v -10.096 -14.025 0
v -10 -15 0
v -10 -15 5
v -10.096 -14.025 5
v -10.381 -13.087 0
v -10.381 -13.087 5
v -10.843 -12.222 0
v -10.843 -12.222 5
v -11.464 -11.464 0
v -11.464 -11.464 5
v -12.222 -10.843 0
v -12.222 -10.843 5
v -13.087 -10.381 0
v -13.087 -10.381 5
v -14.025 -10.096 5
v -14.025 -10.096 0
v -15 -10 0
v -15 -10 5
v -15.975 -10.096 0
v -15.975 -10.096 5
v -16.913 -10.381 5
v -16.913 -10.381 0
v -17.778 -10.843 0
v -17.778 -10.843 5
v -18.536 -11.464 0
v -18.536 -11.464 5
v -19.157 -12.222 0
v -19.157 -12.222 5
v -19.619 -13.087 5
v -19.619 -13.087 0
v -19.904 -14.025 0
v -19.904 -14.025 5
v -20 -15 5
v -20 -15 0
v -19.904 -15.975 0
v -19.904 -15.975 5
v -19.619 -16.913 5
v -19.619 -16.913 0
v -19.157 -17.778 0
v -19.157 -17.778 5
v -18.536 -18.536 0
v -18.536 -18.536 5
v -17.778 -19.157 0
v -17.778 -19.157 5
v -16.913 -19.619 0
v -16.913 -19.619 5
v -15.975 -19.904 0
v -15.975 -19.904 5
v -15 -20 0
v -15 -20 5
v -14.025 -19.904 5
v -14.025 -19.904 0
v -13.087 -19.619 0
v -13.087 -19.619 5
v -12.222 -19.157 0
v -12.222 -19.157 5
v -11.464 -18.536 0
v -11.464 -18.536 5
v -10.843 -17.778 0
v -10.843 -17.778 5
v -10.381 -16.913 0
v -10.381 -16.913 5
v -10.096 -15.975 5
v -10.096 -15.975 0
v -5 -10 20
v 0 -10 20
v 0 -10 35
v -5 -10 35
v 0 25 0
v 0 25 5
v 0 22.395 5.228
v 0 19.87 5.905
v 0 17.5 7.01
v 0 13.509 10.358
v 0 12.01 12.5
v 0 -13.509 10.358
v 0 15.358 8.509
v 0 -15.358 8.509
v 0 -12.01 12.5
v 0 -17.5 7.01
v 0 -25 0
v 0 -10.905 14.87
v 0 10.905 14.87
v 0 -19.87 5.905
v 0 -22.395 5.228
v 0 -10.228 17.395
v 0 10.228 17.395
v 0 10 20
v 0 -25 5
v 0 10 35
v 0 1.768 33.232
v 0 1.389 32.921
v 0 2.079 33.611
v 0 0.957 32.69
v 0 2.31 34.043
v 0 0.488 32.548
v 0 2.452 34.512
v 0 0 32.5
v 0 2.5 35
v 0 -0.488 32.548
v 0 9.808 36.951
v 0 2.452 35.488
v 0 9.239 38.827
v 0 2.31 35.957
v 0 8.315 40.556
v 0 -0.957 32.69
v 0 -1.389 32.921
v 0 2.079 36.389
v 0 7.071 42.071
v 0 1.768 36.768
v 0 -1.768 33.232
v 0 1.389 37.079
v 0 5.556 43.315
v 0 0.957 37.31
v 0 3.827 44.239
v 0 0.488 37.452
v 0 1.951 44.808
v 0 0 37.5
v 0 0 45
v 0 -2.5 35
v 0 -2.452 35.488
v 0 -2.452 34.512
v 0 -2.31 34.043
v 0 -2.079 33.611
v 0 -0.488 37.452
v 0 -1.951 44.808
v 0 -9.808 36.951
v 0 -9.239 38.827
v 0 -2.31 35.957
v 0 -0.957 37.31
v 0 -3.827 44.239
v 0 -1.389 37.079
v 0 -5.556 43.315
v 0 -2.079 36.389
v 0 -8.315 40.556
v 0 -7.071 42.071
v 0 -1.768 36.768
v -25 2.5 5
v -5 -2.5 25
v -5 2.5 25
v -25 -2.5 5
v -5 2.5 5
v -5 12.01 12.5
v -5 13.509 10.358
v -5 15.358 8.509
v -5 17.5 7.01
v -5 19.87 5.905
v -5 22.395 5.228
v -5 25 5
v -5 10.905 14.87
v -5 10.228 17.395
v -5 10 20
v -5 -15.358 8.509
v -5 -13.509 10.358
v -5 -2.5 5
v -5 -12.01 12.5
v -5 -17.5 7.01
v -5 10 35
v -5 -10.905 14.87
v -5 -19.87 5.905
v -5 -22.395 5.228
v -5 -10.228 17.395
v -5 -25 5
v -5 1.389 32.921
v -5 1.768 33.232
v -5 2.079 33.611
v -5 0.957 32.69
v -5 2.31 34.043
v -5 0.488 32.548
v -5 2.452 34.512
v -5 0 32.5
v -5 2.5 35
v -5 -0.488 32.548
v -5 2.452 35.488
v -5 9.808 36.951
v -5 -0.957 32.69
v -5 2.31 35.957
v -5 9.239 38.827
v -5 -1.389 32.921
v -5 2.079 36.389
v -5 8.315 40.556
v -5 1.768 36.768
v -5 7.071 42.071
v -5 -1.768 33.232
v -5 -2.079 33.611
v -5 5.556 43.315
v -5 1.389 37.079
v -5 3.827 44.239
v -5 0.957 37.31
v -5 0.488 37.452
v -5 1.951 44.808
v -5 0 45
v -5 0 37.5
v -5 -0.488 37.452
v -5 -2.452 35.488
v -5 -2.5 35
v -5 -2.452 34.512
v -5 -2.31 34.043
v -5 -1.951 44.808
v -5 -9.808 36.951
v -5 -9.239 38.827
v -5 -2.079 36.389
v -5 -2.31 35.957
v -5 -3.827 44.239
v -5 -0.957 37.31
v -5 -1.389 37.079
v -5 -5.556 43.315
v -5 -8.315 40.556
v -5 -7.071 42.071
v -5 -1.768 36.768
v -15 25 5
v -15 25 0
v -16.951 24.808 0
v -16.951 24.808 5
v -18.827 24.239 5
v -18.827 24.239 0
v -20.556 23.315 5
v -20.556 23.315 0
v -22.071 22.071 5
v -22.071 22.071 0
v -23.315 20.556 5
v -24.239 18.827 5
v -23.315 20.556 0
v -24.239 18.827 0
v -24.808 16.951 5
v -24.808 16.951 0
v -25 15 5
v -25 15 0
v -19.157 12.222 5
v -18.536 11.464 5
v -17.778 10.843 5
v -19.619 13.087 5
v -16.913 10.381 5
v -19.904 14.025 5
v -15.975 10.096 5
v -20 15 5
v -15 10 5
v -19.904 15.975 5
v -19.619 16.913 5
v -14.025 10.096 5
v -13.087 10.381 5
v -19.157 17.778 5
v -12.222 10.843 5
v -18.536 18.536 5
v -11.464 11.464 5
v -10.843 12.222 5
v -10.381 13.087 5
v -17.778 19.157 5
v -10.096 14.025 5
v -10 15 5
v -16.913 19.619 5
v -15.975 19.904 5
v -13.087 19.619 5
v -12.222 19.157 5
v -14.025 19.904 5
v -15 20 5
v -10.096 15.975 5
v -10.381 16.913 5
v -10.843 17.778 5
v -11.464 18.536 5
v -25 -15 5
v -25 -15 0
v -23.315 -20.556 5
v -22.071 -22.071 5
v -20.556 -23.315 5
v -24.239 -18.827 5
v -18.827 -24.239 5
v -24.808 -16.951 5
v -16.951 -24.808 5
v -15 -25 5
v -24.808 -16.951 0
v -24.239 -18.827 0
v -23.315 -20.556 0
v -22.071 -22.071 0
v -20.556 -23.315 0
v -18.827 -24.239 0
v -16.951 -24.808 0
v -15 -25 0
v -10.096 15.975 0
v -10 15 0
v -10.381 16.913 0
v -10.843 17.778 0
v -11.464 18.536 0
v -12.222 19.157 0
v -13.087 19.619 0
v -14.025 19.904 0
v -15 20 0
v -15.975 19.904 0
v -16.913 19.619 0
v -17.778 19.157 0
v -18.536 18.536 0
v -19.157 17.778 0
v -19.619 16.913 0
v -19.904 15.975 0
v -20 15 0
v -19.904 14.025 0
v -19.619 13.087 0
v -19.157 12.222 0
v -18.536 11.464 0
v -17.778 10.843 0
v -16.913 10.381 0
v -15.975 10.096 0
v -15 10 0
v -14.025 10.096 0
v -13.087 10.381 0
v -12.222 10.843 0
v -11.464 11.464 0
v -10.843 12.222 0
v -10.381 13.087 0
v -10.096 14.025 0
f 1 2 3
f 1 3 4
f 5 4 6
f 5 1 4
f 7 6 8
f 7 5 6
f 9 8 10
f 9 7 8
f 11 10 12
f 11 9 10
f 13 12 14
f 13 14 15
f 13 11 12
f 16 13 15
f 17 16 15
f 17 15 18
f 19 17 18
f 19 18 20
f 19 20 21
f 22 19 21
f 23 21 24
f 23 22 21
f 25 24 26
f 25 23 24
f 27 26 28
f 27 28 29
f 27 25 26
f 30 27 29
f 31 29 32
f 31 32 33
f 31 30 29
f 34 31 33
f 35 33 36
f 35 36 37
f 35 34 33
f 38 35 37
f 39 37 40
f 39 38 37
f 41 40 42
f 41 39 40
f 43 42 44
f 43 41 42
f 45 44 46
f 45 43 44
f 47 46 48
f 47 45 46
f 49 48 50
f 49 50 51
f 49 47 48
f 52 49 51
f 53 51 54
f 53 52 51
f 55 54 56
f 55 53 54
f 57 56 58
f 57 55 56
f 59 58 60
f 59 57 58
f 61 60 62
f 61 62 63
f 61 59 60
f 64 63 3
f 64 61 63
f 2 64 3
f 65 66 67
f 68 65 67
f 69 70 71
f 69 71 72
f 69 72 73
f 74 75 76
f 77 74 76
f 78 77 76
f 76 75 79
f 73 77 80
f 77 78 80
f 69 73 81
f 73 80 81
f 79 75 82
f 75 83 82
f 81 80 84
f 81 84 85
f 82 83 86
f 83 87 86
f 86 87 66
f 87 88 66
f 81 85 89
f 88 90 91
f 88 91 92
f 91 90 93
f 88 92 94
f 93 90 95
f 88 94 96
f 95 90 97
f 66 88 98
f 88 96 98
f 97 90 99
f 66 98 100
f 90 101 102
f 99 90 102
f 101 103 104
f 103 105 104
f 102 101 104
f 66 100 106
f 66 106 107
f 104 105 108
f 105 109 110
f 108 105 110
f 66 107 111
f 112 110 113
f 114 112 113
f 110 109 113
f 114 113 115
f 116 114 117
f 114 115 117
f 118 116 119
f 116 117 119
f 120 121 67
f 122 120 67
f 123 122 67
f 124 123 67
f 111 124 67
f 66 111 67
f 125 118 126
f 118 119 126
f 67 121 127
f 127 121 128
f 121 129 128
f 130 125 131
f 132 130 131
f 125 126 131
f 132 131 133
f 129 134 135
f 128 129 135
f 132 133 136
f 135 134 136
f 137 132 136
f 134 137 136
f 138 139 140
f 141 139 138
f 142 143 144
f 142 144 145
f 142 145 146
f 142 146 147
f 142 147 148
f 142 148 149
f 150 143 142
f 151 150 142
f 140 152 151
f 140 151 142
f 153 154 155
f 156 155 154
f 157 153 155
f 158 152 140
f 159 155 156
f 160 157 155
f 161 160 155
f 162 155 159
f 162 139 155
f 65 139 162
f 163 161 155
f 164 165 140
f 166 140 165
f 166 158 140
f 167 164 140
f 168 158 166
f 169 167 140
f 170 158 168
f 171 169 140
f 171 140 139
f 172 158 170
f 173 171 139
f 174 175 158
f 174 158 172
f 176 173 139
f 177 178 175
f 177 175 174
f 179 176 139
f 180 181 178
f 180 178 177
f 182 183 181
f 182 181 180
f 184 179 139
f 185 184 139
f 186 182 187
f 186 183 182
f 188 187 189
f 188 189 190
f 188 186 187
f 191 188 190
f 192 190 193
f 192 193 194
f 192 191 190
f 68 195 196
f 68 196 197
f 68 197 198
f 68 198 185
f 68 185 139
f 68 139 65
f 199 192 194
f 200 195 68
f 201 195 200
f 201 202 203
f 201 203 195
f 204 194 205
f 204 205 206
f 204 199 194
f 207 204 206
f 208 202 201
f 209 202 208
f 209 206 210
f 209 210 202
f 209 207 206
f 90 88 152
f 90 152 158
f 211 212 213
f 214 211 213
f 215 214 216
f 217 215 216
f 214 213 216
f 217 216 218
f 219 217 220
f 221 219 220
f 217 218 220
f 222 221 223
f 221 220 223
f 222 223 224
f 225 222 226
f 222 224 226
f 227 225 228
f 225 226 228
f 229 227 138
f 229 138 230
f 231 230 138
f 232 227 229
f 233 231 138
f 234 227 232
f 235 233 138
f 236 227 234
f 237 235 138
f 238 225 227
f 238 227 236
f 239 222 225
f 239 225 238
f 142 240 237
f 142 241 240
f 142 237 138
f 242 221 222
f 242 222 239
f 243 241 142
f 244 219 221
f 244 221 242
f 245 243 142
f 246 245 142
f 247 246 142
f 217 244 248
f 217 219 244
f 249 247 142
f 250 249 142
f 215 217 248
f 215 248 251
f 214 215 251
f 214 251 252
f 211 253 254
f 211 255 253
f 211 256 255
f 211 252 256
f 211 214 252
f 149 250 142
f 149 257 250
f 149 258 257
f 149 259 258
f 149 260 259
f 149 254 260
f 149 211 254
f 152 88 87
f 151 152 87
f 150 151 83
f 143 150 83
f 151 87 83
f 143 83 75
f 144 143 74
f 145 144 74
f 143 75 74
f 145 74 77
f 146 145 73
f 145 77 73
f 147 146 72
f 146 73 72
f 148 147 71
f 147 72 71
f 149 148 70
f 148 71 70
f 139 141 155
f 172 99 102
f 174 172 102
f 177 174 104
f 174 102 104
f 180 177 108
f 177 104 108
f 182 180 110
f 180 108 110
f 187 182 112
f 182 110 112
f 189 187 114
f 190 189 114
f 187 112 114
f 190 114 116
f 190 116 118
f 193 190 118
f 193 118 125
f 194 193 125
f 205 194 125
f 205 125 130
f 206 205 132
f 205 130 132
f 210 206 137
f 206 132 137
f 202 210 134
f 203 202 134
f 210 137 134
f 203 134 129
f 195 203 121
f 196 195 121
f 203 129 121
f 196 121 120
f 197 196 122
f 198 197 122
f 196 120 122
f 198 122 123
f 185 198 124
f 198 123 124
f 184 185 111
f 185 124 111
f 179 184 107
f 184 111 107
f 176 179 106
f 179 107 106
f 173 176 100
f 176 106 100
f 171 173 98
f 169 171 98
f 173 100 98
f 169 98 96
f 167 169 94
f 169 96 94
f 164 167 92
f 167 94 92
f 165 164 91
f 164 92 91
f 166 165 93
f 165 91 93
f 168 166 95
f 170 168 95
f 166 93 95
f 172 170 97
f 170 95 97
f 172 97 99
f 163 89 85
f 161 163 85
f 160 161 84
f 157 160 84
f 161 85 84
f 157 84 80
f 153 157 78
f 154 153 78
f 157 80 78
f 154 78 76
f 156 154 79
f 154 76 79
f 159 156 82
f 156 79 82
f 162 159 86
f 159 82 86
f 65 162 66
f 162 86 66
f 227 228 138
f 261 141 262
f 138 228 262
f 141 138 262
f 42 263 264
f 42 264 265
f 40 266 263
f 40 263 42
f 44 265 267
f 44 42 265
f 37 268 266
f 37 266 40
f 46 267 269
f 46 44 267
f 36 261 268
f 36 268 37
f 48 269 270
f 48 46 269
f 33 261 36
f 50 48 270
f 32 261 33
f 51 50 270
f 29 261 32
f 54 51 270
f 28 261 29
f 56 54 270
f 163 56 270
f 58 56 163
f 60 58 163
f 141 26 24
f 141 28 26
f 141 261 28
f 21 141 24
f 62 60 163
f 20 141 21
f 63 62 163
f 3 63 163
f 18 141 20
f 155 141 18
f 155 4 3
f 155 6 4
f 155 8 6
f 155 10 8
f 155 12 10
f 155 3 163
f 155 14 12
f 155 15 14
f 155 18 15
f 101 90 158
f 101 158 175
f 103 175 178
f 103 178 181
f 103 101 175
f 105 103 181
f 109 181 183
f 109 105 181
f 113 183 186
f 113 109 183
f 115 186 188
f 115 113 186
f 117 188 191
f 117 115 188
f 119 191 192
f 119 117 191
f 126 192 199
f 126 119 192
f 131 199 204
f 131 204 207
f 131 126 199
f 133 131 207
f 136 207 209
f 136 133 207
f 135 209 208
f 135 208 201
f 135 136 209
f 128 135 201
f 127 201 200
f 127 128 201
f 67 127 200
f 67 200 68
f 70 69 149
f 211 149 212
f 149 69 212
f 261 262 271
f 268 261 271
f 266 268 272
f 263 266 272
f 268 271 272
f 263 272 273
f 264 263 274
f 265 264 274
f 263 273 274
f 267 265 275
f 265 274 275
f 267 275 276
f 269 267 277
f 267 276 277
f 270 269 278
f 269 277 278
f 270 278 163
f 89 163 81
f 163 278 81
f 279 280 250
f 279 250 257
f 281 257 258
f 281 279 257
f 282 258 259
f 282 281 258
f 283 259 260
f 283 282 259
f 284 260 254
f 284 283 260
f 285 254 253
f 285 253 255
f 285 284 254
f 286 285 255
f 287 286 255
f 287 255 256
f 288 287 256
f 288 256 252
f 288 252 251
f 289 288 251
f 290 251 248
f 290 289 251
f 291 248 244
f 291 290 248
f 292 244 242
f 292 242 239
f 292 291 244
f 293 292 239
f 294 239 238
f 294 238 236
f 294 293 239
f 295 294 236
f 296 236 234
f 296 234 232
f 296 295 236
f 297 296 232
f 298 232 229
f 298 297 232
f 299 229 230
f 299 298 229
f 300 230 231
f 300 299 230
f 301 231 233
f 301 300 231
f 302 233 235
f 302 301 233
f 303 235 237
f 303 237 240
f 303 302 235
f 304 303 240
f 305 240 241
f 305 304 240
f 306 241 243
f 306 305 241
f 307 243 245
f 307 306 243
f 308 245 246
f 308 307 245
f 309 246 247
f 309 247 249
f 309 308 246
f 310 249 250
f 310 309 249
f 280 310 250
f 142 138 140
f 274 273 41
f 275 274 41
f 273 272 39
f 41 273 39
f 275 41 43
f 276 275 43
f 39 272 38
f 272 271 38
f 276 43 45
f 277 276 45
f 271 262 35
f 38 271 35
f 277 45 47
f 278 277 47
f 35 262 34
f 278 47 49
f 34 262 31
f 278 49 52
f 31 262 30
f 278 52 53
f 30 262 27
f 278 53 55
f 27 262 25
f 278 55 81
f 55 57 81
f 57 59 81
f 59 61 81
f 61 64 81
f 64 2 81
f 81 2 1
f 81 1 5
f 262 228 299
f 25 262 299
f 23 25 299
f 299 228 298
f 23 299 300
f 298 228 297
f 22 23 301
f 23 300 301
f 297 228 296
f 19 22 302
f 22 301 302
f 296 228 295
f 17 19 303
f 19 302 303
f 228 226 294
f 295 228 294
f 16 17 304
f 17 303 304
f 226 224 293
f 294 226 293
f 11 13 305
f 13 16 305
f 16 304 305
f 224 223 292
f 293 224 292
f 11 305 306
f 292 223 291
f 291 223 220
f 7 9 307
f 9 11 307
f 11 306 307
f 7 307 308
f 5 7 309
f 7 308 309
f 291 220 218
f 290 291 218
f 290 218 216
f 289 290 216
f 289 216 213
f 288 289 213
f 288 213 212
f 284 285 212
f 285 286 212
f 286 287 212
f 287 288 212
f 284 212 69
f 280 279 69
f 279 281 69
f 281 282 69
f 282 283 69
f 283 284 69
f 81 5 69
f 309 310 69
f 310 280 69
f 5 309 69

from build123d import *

# Parameters (mm, degrees)
SKETCH002_R  = 5
PAD001_DEPTH = 5
SKETCH003_R  = 2.5
PAD002_DEPTH = 5
PAD003_DEPTH = 2.5


with BuildPart() as part:
    # Sketch002 → Pad001 (new body)
    with BuildSketch(Plane.XY):
        with BuildLine():
            Line((0, 25), (-15, 25))
            ThreePointArc((-15, 25), (-22.071068, 22.071068), (-25, 15))
            Line((-25, 15), (-25, -15))
            ThreePointArc((-25, -15), (-22.071068, -22.071068), (-15, -25))
            Line((-15, -25), (0, -25))
            Line((0, -25), (0, 25))
        make_face()
        with Locations((-15, 15)):
            Circle(SKETCH002_R, mode=Mode.SUBTRACT)
        with Locations((-15, -15)):
            Circle(SKETCH002_R, mode=Mode.SUBTRACT)
    extrude(amount=PAD001_DEPTH)

    # Sketch003 → Pad002 (join)
    with BuildSketch(Plane.YZ):
        with BuildLine():
            ThreePointArc((-25, 5), (-14.393398, 9.393398), (-10, 20))
            Line((-10, 20), (-10, 35))
            ThreePointArc((10, 35), (0, 45), (-10, 35))
            Line((10, 20), (10, 35))
            ThreePointArc((10, 20), (14.393398, 9.393398), (25, 5))
            Line((-25, 5), (25, 5))
        make_face()
        with Locations((0, 35)):
            Circle(SKETCH003_R, mode=Mode.SUBTRACT)
    extrude(amount=-PAD002_DEPTH)

    # Sketch004 → Pad003 (join, symmetric)
    with BuildSketch(Plane.XZ):
        Polygon((-25, 5), (-5, 5), (-5, 25), align=None)
    extrude(amount=PAD003_DEPTH, both=True)


solid = part.part
